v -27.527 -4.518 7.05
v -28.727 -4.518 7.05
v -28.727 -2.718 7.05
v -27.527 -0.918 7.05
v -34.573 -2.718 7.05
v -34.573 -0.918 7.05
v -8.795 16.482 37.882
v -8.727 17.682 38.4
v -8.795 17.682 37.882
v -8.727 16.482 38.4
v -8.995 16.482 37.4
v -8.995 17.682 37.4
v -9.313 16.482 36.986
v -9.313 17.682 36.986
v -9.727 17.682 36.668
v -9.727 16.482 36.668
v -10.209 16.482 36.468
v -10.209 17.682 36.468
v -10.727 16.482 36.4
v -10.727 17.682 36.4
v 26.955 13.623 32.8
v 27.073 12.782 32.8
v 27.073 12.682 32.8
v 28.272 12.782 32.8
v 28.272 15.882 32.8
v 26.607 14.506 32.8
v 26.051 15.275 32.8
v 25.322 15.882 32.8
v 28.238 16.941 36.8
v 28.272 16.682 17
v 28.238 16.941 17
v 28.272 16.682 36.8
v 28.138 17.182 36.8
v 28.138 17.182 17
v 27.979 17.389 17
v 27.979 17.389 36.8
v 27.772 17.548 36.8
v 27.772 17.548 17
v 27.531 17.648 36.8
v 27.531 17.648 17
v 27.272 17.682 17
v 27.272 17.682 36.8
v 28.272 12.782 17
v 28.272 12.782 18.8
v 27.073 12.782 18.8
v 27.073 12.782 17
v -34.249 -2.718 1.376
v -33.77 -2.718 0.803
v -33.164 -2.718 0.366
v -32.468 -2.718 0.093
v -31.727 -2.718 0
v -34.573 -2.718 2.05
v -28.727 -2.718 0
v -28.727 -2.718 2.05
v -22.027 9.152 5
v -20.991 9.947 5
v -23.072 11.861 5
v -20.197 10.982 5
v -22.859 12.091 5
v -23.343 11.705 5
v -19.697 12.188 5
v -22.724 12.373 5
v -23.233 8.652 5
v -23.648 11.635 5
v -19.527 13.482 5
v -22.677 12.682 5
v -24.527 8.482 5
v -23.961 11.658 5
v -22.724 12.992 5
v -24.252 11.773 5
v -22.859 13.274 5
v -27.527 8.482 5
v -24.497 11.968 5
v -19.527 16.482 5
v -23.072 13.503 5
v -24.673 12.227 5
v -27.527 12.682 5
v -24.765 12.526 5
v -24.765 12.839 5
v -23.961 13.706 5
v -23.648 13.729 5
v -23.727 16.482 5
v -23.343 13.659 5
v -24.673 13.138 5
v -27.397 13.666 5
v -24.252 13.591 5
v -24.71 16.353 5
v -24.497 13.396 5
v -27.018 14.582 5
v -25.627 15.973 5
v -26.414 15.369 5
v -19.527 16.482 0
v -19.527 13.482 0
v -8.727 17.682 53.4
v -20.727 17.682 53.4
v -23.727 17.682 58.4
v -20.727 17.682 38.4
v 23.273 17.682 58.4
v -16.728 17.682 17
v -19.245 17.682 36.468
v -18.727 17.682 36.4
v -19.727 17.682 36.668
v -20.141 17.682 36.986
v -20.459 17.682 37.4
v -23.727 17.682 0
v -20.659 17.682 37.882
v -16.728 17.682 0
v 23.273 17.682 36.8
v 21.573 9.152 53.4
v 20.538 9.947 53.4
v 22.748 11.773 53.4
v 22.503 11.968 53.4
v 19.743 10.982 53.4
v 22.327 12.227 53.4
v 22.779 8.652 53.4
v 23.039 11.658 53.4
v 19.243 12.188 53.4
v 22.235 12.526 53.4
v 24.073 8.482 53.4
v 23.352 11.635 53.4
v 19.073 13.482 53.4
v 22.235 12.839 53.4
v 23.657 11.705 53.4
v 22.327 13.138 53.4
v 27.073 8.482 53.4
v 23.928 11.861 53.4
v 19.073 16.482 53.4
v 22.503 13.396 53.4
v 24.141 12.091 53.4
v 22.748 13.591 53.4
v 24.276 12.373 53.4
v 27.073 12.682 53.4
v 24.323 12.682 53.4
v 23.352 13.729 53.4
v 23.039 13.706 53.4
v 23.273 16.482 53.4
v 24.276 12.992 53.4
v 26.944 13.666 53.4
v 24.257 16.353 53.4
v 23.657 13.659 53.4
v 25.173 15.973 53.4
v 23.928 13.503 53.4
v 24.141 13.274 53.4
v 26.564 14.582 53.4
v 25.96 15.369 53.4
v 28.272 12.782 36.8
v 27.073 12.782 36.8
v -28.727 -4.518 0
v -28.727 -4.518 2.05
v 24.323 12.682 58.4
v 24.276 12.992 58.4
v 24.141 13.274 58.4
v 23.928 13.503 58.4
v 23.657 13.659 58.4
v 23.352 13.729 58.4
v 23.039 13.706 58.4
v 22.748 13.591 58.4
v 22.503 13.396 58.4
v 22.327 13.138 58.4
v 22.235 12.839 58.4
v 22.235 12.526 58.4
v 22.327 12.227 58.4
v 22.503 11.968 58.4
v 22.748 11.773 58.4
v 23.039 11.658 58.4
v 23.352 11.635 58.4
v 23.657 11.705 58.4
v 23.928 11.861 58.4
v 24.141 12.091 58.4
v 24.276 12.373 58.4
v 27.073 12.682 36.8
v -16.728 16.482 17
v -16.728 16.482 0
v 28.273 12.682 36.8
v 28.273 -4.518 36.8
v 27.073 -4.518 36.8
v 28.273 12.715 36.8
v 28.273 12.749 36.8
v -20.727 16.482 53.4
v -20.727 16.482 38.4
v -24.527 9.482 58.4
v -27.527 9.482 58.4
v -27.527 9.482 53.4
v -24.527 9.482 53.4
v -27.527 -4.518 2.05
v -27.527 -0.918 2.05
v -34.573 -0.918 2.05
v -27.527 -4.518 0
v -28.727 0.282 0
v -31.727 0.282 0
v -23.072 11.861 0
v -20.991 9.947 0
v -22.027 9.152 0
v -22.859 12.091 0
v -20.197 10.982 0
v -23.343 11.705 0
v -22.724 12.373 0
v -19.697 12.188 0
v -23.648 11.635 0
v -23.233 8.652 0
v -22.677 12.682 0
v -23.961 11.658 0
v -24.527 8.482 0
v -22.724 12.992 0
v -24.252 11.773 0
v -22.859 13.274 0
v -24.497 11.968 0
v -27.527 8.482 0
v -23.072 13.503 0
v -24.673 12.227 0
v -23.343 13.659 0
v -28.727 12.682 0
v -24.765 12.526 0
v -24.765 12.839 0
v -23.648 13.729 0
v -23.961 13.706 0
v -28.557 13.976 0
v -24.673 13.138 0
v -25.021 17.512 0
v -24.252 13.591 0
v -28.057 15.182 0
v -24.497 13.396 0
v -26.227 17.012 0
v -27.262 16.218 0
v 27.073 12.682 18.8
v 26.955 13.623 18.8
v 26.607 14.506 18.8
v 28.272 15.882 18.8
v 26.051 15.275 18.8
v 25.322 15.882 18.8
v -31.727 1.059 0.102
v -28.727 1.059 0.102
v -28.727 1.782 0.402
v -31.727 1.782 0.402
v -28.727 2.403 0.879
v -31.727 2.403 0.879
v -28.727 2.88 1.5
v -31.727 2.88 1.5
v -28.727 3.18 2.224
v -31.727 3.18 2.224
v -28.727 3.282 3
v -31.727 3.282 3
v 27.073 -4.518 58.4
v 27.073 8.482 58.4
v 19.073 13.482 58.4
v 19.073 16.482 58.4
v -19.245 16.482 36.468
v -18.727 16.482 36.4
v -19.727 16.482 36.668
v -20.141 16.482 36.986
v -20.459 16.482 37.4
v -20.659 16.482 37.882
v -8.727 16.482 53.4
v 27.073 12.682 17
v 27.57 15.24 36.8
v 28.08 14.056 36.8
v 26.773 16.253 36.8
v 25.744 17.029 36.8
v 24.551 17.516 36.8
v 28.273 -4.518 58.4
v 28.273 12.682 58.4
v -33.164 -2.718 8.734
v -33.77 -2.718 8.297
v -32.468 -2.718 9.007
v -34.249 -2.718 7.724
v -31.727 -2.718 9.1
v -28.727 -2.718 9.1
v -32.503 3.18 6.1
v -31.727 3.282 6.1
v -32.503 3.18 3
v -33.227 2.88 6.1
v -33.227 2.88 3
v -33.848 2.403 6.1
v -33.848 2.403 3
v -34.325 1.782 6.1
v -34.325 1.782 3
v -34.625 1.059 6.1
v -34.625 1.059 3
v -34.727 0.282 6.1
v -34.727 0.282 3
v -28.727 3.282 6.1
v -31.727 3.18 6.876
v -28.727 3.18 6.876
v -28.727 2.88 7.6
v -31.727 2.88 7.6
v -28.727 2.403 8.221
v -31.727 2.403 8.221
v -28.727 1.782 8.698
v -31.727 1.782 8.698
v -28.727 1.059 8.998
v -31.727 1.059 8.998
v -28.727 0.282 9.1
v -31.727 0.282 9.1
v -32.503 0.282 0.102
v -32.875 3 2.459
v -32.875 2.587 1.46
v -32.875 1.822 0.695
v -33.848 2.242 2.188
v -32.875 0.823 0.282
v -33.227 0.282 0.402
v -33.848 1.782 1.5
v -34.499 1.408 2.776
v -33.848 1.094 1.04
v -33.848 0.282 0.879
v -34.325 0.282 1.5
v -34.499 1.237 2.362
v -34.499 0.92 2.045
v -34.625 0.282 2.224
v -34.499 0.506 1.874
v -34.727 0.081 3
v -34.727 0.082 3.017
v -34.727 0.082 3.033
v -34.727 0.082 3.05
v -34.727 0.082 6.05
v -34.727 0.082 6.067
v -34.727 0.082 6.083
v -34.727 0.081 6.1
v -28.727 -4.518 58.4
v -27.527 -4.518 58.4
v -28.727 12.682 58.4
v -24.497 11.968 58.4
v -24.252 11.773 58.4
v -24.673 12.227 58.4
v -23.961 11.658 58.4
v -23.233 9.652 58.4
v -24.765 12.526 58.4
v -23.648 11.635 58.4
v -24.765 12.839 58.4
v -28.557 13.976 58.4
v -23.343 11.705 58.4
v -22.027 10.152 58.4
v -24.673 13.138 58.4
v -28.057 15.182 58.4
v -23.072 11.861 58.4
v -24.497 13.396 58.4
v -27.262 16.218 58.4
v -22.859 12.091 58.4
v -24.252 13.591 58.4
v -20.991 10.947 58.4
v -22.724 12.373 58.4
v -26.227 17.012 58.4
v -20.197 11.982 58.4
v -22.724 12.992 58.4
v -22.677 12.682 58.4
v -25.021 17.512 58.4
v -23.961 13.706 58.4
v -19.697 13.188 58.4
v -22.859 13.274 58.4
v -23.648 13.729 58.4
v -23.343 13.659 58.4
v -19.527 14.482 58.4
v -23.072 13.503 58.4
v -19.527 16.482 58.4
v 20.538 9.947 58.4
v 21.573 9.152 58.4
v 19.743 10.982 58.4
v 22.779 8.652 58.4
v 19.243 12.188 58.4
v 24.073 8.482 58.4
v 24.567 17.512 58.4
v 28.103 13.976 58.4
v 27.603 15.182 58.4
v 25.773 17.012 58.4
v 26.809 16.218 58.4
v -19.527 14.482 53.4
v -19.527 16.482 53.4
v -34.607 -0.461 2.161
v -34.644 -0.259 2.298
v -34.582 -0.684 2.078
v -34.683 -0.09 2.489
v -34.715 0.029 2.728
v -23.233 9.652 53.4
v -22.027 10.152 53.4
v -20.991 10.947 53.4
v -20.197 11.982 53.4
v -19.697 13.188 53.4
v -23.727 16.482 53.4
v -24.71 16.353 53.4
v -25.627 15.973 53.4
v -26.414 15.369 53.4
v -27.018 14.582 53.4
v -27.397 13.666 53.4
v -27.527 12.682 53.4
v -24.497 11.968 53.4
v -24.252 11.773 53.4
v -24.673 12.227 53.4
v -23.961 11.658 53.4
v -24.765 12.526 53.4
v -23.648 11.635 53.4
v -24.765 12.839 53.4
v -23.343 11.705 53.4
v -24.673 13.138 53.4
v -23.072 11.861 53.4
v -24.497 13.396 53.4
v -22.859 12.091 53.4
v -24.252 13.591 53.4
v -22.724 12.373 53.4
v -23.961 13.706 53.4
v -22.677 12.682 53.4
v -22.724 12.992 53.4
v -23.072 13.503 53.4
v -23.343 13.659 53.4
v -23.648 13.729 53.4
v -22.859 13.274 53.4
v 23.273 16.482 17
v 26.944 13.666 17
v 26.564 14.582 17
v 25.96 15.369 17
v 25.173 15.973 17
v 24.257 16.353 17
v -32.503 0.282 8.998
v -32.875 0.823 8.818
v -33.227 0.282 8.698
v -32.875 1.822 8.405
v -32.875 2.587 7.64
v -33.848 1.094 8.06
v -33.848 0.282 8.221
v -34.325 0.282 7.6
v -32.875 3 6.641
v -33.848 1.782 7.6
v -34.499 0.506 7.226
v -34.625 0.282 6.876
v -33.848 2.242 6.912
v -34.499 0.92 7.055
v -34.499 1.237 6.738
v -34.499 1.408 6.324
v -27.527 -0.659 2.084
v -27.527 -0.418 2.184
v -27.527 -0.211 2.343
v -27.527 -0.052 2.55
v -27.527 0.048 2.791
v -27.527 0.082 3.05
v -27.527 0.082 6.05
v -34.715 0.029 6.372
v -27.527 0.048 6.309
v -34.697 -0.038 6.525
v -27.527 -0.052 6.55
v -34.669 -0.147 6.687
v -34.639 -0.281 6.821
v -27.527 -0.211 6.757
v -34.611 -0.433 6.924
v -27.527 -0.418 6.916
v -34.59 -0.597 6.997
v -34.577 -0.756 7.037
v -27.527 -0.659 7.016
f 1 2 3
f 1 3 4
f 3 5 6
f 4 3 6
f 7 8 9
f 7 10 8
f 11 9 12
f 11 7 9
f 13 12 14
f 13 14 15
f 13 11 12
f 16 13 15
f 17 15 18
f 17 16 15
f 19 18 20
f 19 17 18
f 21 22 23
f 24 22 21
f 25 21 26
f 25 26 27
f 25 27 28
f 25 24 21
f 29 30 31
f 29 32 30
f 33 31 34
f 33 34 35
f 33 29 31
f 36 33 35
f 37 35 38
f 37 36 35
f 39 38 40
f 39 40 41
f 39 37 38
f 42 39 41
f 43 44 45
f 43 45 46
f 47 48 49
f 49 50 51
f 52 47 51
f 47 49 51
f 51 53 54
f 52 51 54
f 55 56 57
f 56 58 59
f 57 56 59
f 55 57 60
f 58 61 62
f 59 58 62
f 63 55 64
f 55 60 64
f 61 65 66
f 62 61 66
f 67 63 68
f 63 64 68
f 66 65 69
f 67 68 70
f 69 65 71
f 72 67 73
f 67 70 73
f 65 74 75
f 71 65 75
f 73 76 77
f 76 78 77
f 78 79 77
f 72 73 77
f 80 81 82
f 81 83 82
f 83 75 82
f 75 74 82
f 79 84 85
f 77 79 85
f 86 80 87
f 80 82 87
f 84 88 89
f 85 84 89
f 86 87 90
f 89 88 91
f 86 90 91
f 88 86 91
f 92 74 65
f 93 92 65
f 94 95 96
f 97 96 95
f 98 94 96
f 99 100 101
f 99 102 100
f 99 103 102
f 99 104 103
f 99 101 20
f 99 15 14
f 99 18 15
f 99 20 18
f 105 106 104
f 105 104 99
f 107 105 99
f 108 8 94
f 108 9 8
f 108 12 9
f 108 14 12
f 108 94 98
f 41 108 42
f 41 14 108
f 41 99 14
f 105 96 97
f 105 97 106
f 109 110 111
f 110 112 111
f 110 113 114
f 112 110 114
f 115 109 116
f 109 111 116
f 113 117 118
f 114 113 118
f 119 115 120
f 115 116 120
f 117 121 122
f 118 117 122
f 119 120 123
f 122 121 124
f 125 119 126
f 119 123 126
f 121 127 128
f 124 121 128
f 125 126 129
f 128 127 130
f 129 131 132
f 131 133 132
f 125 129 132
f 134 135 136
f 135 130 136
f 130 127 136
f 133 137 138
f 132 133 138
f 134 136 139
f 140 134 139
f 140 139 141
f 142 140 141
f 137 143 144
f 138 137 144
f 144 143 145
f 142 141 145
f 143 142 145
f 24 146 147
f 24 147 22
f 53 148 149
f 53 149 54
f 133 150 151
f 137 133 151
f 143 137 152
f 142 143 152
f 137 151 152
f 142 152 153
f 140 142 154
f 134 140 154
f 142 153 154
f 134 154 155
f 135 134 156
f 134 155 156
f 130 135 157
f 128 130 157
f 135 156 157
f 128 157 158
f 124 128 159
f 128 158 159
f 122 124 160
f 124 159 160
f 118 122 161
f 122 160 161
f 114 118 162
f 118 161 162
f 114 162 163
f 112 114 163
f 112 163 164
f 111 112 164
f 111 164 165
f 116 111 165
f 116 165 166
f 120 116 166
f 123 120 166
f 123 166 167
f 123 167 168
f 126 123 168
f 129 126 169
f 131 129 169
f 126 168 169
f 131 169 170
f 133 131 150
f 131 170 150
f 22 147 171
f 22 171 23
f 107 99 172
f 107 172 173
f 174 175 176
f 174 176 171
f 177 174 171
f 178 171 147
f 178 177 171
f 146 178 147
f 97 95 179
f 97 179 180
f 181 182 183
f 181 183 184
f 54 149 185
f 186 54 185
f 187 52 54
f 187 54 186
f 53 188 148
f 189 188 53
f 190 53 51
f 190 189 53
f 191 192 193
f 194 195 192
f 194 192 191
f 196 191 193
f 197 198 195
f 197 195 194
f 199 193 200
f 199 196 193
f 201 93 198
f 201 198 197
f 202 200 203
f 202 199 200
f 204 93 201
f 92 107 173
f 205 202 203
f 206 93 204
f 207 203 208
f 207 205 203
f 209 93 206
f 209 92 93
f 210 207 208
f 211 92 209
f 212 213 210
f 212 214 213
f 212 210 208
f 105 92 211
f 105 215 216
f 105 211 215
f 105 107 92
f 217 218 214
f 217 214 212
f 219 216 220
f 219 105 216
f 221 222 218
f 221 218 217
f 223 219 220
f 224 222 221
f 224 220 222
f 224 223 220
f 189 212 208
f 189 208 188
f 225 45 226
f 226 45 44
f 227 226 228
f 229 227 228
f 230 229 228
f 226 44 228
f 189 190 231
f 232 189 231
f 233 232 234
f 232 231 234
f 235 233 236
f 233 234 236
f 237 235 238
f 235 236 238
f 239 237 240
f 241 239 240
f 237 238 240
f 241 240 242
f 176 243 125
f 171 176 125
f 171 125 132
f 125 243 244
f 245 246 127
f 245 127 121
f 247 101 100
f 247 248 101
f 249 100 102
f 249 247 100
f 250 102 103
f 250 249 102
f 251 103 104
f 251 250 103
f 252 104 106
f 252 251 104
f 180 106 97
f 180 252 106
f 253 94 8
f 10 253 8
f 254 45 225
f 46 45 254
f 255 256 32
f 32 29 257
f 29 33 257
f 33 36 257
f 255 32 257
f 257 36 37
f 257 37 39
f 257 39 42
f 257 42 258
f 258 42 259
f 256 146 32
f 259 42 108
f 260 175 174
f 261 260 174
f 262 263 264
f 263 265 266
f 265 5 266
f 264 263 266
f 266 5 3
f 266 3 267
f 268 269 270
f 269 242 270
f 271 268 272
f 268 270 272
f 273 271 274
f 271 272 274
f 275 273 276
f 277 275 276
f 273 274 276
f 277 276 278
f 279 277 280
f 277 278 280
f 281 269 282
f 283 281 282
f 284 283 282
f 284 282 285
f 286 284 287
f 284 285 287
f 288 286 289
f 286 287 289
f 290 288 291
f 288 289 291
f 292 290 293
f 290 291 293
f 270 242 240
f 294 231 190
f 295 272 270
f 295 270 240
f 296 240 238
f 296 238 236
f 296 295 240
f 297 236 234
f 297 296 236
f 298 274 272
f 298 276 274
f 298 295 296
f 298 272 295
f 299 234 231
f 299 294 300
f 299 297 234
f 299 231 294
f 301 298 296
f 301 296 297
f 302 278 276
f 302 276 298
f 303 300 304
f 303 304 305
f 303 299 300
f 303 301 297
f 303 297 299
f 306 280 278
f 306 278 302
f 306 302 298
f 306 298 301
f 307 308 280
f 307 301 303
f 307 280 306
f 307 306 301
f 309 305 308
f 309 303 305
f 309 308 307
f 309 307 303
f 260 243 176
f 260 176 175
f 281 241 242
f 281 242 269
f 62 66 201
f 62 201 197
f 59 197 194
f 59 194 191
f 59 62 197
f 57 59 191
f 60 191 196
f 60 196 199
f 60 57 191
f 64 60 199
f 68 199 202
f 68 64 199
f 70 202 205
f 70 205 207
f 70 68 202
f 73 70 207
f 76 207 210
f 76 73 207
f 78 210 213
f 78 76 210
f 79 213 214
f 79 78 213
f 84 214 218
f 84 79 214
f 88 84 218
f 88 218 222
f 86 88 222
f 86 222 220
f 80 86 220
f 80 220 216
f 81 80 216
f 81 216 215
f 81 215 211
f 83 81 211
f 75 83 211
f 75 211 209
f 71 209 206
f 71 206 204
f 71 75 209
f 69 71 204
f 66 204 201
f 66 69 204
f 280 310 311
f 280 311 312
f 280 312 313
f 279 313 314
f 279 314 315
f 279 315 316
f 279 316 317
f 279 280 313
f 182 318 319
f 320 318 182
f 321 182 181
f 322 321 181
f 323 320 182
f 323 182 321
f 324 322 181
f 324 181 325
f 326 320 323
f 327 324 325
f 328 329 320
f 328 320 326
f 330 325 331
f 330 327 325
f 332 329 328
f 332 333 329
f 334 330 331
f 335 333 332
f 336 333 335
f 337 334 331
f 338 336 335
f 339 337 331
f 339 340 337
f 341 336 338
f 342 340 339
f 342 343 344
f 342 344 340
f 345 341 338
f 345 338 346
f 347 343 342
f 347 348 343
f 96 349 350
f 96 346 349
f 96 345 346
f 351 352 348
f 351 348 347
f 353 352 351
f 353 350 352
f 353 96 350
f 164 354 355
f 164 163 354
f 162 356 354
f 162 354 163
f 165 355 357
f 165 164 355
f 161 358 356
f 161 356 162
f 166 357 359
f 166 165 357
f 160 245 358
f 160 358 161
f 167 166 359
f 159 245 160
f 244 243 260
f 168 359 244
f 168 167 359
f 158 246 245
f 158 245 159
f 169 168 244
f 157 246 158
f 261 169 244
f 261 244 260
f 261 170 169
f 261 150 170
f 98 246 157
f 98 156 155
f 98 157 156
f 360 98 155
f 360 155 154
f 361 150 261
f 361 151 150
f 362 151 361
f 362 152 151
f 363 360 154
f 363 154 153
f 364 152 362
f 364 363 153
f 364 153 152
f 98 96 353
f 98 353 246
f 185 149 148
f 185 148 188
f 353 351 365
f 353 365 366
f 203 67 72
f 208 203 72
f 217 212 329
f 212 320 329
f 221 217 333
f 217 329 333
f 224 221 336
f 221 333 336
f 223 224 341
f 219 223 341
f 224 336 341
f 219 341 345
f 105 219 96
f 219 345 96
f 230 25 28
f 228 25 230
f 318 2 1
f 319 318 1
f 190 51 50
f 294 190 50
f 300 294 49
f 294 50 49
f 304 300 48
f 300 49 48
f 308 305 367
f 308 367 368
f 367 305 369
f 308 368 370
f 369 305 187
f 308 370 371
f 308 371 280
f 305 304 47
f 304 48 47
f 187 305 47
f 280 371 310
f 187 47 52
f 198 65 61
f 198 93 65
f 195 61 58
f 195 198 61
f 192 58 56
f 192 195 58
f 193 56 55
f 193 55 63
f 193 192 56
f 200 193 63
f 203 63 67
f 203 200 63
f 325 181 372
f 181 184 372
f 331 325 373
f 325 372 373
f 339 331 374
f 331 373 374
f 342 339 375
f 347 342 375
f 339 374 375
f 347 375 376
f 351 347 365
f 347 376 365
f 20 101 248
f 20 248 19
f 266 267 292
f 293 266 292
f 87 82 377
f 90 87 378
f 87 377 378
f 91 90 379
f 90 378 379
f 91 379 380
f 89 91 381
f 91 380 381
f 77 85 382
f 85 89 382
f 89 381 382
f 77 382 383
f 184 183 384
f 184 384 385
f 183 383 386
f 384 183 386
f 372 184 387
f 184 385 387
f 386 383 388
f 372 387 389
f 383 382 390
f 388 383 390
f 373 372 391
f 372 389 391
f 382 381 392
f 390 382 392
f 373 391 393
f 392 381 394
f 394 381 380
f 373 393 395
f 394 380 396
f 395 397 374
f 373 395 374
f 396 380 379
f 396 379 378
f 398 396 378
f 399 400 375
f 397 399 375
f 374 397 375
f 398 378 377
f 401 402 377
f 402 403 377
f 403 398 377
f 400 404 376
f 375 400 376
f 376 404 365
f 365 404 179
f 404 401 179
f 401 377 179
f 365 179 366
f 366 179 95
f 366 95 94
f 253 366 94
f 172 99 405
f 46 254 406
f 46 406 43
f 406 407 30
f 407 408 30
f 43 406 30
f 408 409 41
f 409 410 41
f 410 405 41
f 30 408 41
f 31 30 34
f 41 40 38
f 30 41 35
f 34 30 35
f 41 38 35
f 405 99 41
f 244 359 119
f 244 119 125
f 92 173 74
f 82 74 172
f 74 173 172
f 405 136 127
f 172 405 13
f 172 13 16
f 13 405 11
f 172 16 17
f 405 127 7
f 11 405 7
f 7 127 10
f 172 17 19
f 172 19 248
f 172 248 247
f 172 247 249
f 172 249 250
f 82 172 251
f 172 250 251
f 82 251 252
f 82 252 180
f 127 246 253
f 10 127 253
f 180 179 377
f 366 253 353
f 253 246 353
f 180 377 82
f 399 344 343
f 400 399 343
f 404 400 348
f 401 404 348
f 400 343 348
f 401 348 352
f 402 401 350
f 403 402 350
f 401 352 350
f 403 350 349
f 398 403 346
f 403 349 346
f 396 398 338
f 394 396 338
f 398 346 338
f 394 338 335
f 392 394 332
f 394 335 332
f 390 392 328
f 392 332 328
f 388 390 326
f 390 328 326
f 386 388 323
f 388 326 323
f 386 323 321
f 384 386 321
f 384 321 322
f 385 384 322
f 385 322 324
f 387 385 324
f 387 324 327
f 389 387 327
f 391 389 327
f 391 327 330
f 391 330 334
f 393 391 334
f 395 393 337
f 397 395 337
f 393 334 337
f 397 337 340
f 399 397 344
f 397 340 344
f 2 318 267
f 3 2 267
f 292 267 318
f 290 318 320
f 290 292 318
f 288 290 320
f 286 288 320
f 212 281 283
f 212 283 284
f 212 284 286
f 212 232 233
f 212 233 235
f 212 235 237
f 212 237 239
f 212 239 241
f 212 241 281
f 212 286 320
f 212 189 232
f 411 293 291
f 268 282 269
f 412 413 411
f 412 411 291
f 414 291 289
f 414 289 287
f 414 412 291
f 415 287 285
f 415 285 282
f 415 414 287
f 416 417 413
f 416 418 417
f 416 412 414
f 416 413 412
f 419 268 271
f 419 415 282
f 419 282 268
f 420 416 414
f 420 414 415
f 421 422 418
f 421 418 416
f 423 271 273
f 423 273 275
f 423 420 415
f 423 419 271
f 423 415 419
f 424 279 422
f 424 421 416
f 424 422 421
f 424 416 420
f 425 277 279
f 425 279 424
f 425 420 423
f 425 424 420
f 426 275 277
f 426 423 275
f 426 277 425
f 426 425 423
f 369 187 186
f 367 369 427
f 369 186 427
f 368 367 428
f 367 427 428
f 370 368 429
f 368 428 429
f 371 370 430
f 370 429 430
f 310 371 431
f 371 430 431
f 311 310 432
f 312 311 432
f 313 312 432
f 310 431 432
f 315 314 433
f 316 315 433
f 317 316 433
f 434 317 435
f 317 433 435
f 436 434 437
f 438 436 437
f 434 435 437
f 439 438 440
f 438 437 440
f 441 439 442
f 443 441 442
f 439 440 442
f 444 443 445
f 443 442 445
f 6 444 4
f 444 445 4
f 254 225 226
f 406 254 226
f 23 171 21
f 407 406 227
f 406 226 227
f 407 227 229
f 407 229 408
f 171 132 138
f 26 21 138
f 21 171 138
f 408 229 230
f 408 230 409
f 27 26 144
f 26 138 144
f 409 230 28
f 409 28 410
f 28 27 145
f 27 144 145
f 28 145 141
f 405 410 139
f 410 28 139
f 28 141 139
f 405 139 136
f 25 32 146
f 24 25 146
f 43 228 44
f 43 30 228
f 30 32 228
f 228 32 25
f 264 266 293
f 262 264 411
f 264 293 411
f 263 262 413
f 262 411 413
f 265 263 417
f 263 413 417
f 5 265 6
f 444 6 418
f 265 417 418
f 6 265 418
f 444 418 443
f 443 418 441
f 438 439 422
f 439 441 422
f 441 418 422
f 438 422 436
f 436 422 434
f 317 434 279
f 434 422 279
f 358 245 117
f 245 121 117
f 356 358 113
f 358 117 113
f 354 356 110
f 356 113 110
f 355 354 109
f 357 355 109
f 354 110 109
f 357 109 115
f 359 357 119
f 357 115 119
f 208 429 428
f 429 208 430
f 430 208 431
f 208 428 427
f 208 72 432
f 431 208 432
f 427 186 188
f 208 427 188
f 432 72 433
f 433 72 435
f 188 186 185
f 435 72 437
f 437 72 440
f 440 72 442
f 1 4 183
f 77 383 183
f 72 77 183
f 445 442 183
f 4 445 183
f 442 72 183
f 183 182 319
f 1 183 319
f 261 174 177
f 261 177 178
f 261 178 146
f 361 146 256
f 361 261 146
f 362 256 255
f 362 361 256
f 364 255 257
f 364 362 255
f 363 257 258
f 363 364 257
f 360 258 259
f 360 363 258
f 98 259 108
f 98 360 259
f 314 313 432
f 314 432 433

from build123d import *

# Parameters (mm, degrees)
SKETCH1_W           = 57
SKETCH1_H           = 22.6
BOSS_EXTRUDE1_DEPTH = 58.4
FILLET1_R           = 5
CUT_EXTRUDE1_DEPTH  = 58.4
SKETCH3_W           = 36.8
SKETCH3_H           = 17.7
CUT_EXTRUDE2_DEPTH  = 1.2
SKETCH5_W           = 45
SKETCH5_H           = 17
CUT_EXTRUDE5_DEPTH  = 69.895242719
SKETCH6_W           = 12
SKETCH6_H           = 17
CUT_EXTRUDE6_DEPTH  = 1.2
FILLET3_R           = 2
SKETCH7_R           = 1.05
BOSS_EXTRUDE2_DEPTH = 5
FILLET4_R           = 5
BOSS_EXTRUDE3_START = -5
SKETCH8_R           = 1.05
BOSS_EXTRUDE3_DEPTH = 5
FILLET5_R           = 5
SKETCH10_W          = 9.1
SKETCH10_H          = 6
BOSS_EXTRUDE4_DEPTH = 6
CUT_EXTRUDE8_REACH  = 89.705
SKETCH11_W          = 5
SKETCH11_H          = 5
FILLET6_R           = 3
FILLET7_R           = 3
FILLET8_R           = 1
SKETCH12_W          = 57
SKETCH12_H          = 0.4
CUT_EXTRUDE9_DEPTH  = 71.208070265
BOSS_EXTRUDE5_DEPTH = 19.8
SKETCH4_W           = 14
SKETCH4_H           = 3.2
CUT_EXTRUDE3_DEPTH  = 5
FILLET9_R           = 1


with BuildPart() as part:
    # Sketch1 → Boss-Extrude1 (new body)
    with BuildSketch(Plane.XY):
        with Locations((-0.22689453, 6.382078673)):
            Rectangle(SKETCH1_W, SKETCH1_H)
    extrude(amount=BOSS_EXTRUDE1_DEPTH)

    # Fillet1
    fillet1_edges = [part.edges().sort_by_distance(p)[0] for p in [
        (-28.72689453, 17.682078673, 29.2),
        (28.27310547, 17.682078673, 29.2),
    ]]
    fillet(fillet1_edges, radius=FILLET1_R)

    # Sketch2 → Cut-Extrude1 (cut)
    with BuildSketch(Plane.XY.offset(58.4)):
        with BuildLine():
            Line((-27.52689453, -4.917921327), (27.07310547, -4.917921327))
            Line((27.07310547, -4.917921327), (27.07310547, 12.682078673))
            ThreePointArc((27.07310547, 12.682078673), (25.960111239, 15.369084441), (23.27310547, 16.482078673))
            Line((23.27310547, 16.482078673), (-23.72689453, 16.482078673))
            ThreePointArc((-23.72689453, 16.482078673), (-26.413900298, 15.369084441), (-27.52689453, 12.682078673))
            Line((-27.52689453, 12.682078673), (-27.52689453, -4.917921327))
        make_face()
    extrude(amount=-CUT_EXTRUDE1_DEPTH, mode=Mode.SUBTRACT)

    # Sketch3 → Cut-Extrude2 (cut)
    with BuildSketch(Plane(origin=(28.27310547, 0, 0), x_dir=(0, 0, -1), z_dir=(1, 0, 0))):
        with Locations((-18.4, 3.932078673)):
            Rectangle(SKETCH3_W, SKETCH3_H)
    extrude(amount=-CUT_EXTRUDE2_DEPTH, mode=Mode.SUBTRACT)

    # Sketch5 → Cut-Extrude5 (cut, through all)
    with BuildSketch(Plane(origin=(0, 17.682078673, 0), x_dir=(1, 0, 0), z_dir=(0, 1, 0))):
        with Locations((5.77210537, -8.5)):
            Rectangle(SKETCH5_W, SKETCH5_H)
    extrude(amount=-CUT_EXTRUDE5_DEPTH, mode=Mode.SUBTRACT)

    # Sketch6 → Cut-Extrude6 (cut)
    with BuildSketch(Plane(origin=(0, 17.682078673, 0), x_dir=(1, 0, 0), z_dir=(0, 1, 0))):
        with Locations((-14.72689453, -44.9)):
            Rectangle(SKETCH6_W, SKETCH6_H)
    extrude(amount=-CUT_EXTRUDE6_DEPTH, mode=Mode.SUBTRACT)

    # Fillet3
    fillet3_edges = [part.edges().sort_by_distance(p)[0] for p in [
        (-20.72689453, 17.082078673, 36.4),
        (-8.72689453, 17.082078673, 36.4),
    ]]
    fillet(fillet3_edges, radius=FILLET3_R)

    # Sketch7 → Boss-Extrude2 (add)
    # profile 1 of 2: a face of its own
    with BuildSketch(Plane.XY.offset(58.4)):
        with BuildLine():
            Line((-27.52689453, 9.482078673), (-19.52689453, 9.482078673))
            Line((-19.52689453, 9.482078673), (-19.52689453, 16.482078673))
            Line((-19.52689453, 16.482078673), (-23.72689453, 16.482078673))
            ThreePointArc((-23.72689453, 16.482078673), (-26.413900298, 15.369084441), (-27.52689453, 12.682078673))
            Line((-27.52689453, 12.682078673), (-27.52689453, 9.482078673))
        make_face()
        with Locations((-23.72689453, 12.682078673)):
            Circle(SKETCH7_R, mode=Mode.SUBTRACT)
    # profile 2 of 2: a face of its own
    with BuildSketch(Plane.XY.offset(58.4)):
        with BuildLine():
            Line((19.07310547, 16.482078673), (19.07310547, 8.482078673))
            Line((19.07310547, 8.482078673), (27.07310547, 8.482078673))
            Line((27.07310547, 8.482078673), (27.07310547, 12.682078673))
            ThreePointArc((27.07310547, 12.682078673), (25.960111239, 15.369084441), (23.27310547, 16.482078673))
            Line((23.27310547, 16.482078673), (19.07310547, 16.482078673))
        make_face()
        with Locations((23.27310547, 12.682078673)):
            Circle(SKETCH7_R, mode=Mode.SUBTRACT)
    extrude(amount=-BOSS_EXTRUDE2_DEPTH)

    # Fillet4
    fillet4_edges = [part.edges().sort_by_distance(p)[0] for p in [
        (-19.52689453, 9.482078673, 55.9),
        (19.07310547, 8.482078673, 55.9),
    ]]
    fillet(fillet4_edges, radius=FILLET4_R)

    # Sketch8 → Boss-Extrude3 (add)
    with BuildSketch(Plane(origin=(0, 0, 0), x_dir=(-1, 0, 0), z_dir=(0, 0, -1)).offset(BOSS_EXTRUDE3_START)):
        with BuildLine():
            Line((19.52689453, 16.482078673), (19.52689453, 8.482078673))
            Line((19.52689453, 8.482078673), (27.52689453, 8.482078673))
            Line((27.52689453, 8.482078673), (27.52689453, 12.682078673))
            ThreePointArc((27.52689453, 12.682078673), (26.413900298, 15.369084441), (23.72689453, 16.482078673))
            Line((23.72689453, 16.482078673), (19.52689453, 16.482078673))
        make_face()
        with Locations(Location((23.72689453, 12.682078673, 0), (0, 0, 180))):
            Circle(SKETCH8_R, mode=Mode.SUBTRACT)
    extrude(amount=BOSS_EXTRUDE3_DEPTH)

    # Fillet5
    fillet5_edges = [part.edges().sort_by_distance(p)[0] for p in [
        (-19.52689453, 8.482078673, 2.5),
    ]]
    fillet(fillet5_edges, radius=FILLET5_R)

    # Sketch10 → Boss-Extrude4 (add)
    with BuildSketch(Plane.ZY.offset(28.72689453)):
        with Locations((4.55, 0.282078673)):
            Rectangle(SKETCH10_W, SKETCH10_H)
    extrude(amount=BOSS_EXTRUDE4_DEPTH)

    # Cut-Extrude8: up to this face of the body (flat: up to its plane)
    cut_extrude8_end = Plane(part.part.faces().sort_by_distance((-27.52689453, 3.623812959, 29.334734165))[0])
    # Sketch11 → Cut-Extrude8 (cut, up to the picked face)
    with BuildSketch(Plane.ZY.offset(34.72689453), mode=Mode.PRIVATE) as cut_extrude8_sk1:
        with Locations((4.55, -2.417921327)):
            Rectangle(SKETCH11_W, SKETCH11_H)
    cut_extrude8_tool1 = split(extrude(cut_extrude8_sk1.sketch, amount=-CUT_EXTRUDE8_REACH, mode=Mode.PRIVATE), bisect_by=cut_extrude8_end, keep=Keep.BOTH, mode=Mode.PRIVATE)
    add(cut_extrude8_tool1.solids().sort_by(Axis((-34.726895, -2.417921, 4.55), (1, 0, 0)))[0], mode=Mode.SUBTRACT)

    # Fillet6
    fillet6_edges = [part.edges().sort_by_distance(p)[0] for p in [
        (-31.72689453, 3.282078673, 0),
        (-31.72689453, 3.282078673, 9.1),
    ]]
    fillet(fillet6_edges, radius=FILLET6_R)

    # Fillet7
    fillet7_edges = [part.edges().sort_by_distance(p)[0] for p in [
        (-34.72689453, -1.217921327, 9.1),
        (-34.72689453, 2.403399016, 8.221320344),
        (-34.72689453, -1.217921327, 0),
        (-34.72689453, 2.403399016, 0.878679656),
        (-34.72689453, 3.282078673, 4.55),
    ]]
    fillet(fillet7_edges, radius=FILLET7_R)

    # Fillet8
    fillet8_edges = [part.edges().sort_by_distance(p)[0] for p in [
        (-31.049699857, 0.082078673, 7.05),
        (-31.049699857, 0.082078673, 2.05),
    ]]
    fillet(fillet8_edges, radius=FILLET8_R)

    # Sketch12 → Cut-Extrude9 (cut, through all)
    with BuildSketch(Plane.XY.offset(58.4)):
        with Locations((-0.22689453, -4.717921327)):
            Rectangle(SKETCH12_W, SKETCH12_H)
    extrude(amount=-CUT_EXTRUDE9_DEPTH, mode=Mode.SUBTRACT)

    # Sketch15 → Boss-Extrude5 (add)
    with BuildSketch(Plane(origin=(0, 0, 17), x_dir=(-1, 0, 0), z_dir=(0, 0, -1))):
        with BuildLine():
            Line((-28.27210537, 12.782078673), (-27.27310547, 12.782078673))
            ThreePointArc((-27.27310547, 12.782078673), (-26.101532595, 15.610505797), (-23.27310547, 16.782078673))
            Line((-23.27310547, 16.782078673), (-23.27310547, 17.682078673))
            Line((-23.27310547, 17.682078673), (-28.27210537, 17.682078673))
            Line((-28.27210537, 17.682078673), (-28.27210537, 12.782078673))
        make_face()
    extrude(amount=-BOSS_EXTRUDE5_DEPTH)

    # Sketch4 → Cut-Extrude3 (cut)
    with BuildSketch(Plane(origin=(28.27310547, 0, 0), x_dir=(0, 0, -1), z_dir=(1, 0, 0))):
        with Locations((-25.8, 14.282078673)):
            Rectangle(SKETCH4_W, SKETCH4_H)
    extrude(amount=-CUT_EXTRUDE3_DEPTH, mode=Mode.SUBTRACT)

    # Fillet9
    fillet9_edges = [part.edges().sort_by_distance(p)[0] for p in [
        (28.27210537, 17.682078673, 26.9),
    ]]
    fillet(fillet9_edges, radius=FILLET9_R)


solid = part.part
